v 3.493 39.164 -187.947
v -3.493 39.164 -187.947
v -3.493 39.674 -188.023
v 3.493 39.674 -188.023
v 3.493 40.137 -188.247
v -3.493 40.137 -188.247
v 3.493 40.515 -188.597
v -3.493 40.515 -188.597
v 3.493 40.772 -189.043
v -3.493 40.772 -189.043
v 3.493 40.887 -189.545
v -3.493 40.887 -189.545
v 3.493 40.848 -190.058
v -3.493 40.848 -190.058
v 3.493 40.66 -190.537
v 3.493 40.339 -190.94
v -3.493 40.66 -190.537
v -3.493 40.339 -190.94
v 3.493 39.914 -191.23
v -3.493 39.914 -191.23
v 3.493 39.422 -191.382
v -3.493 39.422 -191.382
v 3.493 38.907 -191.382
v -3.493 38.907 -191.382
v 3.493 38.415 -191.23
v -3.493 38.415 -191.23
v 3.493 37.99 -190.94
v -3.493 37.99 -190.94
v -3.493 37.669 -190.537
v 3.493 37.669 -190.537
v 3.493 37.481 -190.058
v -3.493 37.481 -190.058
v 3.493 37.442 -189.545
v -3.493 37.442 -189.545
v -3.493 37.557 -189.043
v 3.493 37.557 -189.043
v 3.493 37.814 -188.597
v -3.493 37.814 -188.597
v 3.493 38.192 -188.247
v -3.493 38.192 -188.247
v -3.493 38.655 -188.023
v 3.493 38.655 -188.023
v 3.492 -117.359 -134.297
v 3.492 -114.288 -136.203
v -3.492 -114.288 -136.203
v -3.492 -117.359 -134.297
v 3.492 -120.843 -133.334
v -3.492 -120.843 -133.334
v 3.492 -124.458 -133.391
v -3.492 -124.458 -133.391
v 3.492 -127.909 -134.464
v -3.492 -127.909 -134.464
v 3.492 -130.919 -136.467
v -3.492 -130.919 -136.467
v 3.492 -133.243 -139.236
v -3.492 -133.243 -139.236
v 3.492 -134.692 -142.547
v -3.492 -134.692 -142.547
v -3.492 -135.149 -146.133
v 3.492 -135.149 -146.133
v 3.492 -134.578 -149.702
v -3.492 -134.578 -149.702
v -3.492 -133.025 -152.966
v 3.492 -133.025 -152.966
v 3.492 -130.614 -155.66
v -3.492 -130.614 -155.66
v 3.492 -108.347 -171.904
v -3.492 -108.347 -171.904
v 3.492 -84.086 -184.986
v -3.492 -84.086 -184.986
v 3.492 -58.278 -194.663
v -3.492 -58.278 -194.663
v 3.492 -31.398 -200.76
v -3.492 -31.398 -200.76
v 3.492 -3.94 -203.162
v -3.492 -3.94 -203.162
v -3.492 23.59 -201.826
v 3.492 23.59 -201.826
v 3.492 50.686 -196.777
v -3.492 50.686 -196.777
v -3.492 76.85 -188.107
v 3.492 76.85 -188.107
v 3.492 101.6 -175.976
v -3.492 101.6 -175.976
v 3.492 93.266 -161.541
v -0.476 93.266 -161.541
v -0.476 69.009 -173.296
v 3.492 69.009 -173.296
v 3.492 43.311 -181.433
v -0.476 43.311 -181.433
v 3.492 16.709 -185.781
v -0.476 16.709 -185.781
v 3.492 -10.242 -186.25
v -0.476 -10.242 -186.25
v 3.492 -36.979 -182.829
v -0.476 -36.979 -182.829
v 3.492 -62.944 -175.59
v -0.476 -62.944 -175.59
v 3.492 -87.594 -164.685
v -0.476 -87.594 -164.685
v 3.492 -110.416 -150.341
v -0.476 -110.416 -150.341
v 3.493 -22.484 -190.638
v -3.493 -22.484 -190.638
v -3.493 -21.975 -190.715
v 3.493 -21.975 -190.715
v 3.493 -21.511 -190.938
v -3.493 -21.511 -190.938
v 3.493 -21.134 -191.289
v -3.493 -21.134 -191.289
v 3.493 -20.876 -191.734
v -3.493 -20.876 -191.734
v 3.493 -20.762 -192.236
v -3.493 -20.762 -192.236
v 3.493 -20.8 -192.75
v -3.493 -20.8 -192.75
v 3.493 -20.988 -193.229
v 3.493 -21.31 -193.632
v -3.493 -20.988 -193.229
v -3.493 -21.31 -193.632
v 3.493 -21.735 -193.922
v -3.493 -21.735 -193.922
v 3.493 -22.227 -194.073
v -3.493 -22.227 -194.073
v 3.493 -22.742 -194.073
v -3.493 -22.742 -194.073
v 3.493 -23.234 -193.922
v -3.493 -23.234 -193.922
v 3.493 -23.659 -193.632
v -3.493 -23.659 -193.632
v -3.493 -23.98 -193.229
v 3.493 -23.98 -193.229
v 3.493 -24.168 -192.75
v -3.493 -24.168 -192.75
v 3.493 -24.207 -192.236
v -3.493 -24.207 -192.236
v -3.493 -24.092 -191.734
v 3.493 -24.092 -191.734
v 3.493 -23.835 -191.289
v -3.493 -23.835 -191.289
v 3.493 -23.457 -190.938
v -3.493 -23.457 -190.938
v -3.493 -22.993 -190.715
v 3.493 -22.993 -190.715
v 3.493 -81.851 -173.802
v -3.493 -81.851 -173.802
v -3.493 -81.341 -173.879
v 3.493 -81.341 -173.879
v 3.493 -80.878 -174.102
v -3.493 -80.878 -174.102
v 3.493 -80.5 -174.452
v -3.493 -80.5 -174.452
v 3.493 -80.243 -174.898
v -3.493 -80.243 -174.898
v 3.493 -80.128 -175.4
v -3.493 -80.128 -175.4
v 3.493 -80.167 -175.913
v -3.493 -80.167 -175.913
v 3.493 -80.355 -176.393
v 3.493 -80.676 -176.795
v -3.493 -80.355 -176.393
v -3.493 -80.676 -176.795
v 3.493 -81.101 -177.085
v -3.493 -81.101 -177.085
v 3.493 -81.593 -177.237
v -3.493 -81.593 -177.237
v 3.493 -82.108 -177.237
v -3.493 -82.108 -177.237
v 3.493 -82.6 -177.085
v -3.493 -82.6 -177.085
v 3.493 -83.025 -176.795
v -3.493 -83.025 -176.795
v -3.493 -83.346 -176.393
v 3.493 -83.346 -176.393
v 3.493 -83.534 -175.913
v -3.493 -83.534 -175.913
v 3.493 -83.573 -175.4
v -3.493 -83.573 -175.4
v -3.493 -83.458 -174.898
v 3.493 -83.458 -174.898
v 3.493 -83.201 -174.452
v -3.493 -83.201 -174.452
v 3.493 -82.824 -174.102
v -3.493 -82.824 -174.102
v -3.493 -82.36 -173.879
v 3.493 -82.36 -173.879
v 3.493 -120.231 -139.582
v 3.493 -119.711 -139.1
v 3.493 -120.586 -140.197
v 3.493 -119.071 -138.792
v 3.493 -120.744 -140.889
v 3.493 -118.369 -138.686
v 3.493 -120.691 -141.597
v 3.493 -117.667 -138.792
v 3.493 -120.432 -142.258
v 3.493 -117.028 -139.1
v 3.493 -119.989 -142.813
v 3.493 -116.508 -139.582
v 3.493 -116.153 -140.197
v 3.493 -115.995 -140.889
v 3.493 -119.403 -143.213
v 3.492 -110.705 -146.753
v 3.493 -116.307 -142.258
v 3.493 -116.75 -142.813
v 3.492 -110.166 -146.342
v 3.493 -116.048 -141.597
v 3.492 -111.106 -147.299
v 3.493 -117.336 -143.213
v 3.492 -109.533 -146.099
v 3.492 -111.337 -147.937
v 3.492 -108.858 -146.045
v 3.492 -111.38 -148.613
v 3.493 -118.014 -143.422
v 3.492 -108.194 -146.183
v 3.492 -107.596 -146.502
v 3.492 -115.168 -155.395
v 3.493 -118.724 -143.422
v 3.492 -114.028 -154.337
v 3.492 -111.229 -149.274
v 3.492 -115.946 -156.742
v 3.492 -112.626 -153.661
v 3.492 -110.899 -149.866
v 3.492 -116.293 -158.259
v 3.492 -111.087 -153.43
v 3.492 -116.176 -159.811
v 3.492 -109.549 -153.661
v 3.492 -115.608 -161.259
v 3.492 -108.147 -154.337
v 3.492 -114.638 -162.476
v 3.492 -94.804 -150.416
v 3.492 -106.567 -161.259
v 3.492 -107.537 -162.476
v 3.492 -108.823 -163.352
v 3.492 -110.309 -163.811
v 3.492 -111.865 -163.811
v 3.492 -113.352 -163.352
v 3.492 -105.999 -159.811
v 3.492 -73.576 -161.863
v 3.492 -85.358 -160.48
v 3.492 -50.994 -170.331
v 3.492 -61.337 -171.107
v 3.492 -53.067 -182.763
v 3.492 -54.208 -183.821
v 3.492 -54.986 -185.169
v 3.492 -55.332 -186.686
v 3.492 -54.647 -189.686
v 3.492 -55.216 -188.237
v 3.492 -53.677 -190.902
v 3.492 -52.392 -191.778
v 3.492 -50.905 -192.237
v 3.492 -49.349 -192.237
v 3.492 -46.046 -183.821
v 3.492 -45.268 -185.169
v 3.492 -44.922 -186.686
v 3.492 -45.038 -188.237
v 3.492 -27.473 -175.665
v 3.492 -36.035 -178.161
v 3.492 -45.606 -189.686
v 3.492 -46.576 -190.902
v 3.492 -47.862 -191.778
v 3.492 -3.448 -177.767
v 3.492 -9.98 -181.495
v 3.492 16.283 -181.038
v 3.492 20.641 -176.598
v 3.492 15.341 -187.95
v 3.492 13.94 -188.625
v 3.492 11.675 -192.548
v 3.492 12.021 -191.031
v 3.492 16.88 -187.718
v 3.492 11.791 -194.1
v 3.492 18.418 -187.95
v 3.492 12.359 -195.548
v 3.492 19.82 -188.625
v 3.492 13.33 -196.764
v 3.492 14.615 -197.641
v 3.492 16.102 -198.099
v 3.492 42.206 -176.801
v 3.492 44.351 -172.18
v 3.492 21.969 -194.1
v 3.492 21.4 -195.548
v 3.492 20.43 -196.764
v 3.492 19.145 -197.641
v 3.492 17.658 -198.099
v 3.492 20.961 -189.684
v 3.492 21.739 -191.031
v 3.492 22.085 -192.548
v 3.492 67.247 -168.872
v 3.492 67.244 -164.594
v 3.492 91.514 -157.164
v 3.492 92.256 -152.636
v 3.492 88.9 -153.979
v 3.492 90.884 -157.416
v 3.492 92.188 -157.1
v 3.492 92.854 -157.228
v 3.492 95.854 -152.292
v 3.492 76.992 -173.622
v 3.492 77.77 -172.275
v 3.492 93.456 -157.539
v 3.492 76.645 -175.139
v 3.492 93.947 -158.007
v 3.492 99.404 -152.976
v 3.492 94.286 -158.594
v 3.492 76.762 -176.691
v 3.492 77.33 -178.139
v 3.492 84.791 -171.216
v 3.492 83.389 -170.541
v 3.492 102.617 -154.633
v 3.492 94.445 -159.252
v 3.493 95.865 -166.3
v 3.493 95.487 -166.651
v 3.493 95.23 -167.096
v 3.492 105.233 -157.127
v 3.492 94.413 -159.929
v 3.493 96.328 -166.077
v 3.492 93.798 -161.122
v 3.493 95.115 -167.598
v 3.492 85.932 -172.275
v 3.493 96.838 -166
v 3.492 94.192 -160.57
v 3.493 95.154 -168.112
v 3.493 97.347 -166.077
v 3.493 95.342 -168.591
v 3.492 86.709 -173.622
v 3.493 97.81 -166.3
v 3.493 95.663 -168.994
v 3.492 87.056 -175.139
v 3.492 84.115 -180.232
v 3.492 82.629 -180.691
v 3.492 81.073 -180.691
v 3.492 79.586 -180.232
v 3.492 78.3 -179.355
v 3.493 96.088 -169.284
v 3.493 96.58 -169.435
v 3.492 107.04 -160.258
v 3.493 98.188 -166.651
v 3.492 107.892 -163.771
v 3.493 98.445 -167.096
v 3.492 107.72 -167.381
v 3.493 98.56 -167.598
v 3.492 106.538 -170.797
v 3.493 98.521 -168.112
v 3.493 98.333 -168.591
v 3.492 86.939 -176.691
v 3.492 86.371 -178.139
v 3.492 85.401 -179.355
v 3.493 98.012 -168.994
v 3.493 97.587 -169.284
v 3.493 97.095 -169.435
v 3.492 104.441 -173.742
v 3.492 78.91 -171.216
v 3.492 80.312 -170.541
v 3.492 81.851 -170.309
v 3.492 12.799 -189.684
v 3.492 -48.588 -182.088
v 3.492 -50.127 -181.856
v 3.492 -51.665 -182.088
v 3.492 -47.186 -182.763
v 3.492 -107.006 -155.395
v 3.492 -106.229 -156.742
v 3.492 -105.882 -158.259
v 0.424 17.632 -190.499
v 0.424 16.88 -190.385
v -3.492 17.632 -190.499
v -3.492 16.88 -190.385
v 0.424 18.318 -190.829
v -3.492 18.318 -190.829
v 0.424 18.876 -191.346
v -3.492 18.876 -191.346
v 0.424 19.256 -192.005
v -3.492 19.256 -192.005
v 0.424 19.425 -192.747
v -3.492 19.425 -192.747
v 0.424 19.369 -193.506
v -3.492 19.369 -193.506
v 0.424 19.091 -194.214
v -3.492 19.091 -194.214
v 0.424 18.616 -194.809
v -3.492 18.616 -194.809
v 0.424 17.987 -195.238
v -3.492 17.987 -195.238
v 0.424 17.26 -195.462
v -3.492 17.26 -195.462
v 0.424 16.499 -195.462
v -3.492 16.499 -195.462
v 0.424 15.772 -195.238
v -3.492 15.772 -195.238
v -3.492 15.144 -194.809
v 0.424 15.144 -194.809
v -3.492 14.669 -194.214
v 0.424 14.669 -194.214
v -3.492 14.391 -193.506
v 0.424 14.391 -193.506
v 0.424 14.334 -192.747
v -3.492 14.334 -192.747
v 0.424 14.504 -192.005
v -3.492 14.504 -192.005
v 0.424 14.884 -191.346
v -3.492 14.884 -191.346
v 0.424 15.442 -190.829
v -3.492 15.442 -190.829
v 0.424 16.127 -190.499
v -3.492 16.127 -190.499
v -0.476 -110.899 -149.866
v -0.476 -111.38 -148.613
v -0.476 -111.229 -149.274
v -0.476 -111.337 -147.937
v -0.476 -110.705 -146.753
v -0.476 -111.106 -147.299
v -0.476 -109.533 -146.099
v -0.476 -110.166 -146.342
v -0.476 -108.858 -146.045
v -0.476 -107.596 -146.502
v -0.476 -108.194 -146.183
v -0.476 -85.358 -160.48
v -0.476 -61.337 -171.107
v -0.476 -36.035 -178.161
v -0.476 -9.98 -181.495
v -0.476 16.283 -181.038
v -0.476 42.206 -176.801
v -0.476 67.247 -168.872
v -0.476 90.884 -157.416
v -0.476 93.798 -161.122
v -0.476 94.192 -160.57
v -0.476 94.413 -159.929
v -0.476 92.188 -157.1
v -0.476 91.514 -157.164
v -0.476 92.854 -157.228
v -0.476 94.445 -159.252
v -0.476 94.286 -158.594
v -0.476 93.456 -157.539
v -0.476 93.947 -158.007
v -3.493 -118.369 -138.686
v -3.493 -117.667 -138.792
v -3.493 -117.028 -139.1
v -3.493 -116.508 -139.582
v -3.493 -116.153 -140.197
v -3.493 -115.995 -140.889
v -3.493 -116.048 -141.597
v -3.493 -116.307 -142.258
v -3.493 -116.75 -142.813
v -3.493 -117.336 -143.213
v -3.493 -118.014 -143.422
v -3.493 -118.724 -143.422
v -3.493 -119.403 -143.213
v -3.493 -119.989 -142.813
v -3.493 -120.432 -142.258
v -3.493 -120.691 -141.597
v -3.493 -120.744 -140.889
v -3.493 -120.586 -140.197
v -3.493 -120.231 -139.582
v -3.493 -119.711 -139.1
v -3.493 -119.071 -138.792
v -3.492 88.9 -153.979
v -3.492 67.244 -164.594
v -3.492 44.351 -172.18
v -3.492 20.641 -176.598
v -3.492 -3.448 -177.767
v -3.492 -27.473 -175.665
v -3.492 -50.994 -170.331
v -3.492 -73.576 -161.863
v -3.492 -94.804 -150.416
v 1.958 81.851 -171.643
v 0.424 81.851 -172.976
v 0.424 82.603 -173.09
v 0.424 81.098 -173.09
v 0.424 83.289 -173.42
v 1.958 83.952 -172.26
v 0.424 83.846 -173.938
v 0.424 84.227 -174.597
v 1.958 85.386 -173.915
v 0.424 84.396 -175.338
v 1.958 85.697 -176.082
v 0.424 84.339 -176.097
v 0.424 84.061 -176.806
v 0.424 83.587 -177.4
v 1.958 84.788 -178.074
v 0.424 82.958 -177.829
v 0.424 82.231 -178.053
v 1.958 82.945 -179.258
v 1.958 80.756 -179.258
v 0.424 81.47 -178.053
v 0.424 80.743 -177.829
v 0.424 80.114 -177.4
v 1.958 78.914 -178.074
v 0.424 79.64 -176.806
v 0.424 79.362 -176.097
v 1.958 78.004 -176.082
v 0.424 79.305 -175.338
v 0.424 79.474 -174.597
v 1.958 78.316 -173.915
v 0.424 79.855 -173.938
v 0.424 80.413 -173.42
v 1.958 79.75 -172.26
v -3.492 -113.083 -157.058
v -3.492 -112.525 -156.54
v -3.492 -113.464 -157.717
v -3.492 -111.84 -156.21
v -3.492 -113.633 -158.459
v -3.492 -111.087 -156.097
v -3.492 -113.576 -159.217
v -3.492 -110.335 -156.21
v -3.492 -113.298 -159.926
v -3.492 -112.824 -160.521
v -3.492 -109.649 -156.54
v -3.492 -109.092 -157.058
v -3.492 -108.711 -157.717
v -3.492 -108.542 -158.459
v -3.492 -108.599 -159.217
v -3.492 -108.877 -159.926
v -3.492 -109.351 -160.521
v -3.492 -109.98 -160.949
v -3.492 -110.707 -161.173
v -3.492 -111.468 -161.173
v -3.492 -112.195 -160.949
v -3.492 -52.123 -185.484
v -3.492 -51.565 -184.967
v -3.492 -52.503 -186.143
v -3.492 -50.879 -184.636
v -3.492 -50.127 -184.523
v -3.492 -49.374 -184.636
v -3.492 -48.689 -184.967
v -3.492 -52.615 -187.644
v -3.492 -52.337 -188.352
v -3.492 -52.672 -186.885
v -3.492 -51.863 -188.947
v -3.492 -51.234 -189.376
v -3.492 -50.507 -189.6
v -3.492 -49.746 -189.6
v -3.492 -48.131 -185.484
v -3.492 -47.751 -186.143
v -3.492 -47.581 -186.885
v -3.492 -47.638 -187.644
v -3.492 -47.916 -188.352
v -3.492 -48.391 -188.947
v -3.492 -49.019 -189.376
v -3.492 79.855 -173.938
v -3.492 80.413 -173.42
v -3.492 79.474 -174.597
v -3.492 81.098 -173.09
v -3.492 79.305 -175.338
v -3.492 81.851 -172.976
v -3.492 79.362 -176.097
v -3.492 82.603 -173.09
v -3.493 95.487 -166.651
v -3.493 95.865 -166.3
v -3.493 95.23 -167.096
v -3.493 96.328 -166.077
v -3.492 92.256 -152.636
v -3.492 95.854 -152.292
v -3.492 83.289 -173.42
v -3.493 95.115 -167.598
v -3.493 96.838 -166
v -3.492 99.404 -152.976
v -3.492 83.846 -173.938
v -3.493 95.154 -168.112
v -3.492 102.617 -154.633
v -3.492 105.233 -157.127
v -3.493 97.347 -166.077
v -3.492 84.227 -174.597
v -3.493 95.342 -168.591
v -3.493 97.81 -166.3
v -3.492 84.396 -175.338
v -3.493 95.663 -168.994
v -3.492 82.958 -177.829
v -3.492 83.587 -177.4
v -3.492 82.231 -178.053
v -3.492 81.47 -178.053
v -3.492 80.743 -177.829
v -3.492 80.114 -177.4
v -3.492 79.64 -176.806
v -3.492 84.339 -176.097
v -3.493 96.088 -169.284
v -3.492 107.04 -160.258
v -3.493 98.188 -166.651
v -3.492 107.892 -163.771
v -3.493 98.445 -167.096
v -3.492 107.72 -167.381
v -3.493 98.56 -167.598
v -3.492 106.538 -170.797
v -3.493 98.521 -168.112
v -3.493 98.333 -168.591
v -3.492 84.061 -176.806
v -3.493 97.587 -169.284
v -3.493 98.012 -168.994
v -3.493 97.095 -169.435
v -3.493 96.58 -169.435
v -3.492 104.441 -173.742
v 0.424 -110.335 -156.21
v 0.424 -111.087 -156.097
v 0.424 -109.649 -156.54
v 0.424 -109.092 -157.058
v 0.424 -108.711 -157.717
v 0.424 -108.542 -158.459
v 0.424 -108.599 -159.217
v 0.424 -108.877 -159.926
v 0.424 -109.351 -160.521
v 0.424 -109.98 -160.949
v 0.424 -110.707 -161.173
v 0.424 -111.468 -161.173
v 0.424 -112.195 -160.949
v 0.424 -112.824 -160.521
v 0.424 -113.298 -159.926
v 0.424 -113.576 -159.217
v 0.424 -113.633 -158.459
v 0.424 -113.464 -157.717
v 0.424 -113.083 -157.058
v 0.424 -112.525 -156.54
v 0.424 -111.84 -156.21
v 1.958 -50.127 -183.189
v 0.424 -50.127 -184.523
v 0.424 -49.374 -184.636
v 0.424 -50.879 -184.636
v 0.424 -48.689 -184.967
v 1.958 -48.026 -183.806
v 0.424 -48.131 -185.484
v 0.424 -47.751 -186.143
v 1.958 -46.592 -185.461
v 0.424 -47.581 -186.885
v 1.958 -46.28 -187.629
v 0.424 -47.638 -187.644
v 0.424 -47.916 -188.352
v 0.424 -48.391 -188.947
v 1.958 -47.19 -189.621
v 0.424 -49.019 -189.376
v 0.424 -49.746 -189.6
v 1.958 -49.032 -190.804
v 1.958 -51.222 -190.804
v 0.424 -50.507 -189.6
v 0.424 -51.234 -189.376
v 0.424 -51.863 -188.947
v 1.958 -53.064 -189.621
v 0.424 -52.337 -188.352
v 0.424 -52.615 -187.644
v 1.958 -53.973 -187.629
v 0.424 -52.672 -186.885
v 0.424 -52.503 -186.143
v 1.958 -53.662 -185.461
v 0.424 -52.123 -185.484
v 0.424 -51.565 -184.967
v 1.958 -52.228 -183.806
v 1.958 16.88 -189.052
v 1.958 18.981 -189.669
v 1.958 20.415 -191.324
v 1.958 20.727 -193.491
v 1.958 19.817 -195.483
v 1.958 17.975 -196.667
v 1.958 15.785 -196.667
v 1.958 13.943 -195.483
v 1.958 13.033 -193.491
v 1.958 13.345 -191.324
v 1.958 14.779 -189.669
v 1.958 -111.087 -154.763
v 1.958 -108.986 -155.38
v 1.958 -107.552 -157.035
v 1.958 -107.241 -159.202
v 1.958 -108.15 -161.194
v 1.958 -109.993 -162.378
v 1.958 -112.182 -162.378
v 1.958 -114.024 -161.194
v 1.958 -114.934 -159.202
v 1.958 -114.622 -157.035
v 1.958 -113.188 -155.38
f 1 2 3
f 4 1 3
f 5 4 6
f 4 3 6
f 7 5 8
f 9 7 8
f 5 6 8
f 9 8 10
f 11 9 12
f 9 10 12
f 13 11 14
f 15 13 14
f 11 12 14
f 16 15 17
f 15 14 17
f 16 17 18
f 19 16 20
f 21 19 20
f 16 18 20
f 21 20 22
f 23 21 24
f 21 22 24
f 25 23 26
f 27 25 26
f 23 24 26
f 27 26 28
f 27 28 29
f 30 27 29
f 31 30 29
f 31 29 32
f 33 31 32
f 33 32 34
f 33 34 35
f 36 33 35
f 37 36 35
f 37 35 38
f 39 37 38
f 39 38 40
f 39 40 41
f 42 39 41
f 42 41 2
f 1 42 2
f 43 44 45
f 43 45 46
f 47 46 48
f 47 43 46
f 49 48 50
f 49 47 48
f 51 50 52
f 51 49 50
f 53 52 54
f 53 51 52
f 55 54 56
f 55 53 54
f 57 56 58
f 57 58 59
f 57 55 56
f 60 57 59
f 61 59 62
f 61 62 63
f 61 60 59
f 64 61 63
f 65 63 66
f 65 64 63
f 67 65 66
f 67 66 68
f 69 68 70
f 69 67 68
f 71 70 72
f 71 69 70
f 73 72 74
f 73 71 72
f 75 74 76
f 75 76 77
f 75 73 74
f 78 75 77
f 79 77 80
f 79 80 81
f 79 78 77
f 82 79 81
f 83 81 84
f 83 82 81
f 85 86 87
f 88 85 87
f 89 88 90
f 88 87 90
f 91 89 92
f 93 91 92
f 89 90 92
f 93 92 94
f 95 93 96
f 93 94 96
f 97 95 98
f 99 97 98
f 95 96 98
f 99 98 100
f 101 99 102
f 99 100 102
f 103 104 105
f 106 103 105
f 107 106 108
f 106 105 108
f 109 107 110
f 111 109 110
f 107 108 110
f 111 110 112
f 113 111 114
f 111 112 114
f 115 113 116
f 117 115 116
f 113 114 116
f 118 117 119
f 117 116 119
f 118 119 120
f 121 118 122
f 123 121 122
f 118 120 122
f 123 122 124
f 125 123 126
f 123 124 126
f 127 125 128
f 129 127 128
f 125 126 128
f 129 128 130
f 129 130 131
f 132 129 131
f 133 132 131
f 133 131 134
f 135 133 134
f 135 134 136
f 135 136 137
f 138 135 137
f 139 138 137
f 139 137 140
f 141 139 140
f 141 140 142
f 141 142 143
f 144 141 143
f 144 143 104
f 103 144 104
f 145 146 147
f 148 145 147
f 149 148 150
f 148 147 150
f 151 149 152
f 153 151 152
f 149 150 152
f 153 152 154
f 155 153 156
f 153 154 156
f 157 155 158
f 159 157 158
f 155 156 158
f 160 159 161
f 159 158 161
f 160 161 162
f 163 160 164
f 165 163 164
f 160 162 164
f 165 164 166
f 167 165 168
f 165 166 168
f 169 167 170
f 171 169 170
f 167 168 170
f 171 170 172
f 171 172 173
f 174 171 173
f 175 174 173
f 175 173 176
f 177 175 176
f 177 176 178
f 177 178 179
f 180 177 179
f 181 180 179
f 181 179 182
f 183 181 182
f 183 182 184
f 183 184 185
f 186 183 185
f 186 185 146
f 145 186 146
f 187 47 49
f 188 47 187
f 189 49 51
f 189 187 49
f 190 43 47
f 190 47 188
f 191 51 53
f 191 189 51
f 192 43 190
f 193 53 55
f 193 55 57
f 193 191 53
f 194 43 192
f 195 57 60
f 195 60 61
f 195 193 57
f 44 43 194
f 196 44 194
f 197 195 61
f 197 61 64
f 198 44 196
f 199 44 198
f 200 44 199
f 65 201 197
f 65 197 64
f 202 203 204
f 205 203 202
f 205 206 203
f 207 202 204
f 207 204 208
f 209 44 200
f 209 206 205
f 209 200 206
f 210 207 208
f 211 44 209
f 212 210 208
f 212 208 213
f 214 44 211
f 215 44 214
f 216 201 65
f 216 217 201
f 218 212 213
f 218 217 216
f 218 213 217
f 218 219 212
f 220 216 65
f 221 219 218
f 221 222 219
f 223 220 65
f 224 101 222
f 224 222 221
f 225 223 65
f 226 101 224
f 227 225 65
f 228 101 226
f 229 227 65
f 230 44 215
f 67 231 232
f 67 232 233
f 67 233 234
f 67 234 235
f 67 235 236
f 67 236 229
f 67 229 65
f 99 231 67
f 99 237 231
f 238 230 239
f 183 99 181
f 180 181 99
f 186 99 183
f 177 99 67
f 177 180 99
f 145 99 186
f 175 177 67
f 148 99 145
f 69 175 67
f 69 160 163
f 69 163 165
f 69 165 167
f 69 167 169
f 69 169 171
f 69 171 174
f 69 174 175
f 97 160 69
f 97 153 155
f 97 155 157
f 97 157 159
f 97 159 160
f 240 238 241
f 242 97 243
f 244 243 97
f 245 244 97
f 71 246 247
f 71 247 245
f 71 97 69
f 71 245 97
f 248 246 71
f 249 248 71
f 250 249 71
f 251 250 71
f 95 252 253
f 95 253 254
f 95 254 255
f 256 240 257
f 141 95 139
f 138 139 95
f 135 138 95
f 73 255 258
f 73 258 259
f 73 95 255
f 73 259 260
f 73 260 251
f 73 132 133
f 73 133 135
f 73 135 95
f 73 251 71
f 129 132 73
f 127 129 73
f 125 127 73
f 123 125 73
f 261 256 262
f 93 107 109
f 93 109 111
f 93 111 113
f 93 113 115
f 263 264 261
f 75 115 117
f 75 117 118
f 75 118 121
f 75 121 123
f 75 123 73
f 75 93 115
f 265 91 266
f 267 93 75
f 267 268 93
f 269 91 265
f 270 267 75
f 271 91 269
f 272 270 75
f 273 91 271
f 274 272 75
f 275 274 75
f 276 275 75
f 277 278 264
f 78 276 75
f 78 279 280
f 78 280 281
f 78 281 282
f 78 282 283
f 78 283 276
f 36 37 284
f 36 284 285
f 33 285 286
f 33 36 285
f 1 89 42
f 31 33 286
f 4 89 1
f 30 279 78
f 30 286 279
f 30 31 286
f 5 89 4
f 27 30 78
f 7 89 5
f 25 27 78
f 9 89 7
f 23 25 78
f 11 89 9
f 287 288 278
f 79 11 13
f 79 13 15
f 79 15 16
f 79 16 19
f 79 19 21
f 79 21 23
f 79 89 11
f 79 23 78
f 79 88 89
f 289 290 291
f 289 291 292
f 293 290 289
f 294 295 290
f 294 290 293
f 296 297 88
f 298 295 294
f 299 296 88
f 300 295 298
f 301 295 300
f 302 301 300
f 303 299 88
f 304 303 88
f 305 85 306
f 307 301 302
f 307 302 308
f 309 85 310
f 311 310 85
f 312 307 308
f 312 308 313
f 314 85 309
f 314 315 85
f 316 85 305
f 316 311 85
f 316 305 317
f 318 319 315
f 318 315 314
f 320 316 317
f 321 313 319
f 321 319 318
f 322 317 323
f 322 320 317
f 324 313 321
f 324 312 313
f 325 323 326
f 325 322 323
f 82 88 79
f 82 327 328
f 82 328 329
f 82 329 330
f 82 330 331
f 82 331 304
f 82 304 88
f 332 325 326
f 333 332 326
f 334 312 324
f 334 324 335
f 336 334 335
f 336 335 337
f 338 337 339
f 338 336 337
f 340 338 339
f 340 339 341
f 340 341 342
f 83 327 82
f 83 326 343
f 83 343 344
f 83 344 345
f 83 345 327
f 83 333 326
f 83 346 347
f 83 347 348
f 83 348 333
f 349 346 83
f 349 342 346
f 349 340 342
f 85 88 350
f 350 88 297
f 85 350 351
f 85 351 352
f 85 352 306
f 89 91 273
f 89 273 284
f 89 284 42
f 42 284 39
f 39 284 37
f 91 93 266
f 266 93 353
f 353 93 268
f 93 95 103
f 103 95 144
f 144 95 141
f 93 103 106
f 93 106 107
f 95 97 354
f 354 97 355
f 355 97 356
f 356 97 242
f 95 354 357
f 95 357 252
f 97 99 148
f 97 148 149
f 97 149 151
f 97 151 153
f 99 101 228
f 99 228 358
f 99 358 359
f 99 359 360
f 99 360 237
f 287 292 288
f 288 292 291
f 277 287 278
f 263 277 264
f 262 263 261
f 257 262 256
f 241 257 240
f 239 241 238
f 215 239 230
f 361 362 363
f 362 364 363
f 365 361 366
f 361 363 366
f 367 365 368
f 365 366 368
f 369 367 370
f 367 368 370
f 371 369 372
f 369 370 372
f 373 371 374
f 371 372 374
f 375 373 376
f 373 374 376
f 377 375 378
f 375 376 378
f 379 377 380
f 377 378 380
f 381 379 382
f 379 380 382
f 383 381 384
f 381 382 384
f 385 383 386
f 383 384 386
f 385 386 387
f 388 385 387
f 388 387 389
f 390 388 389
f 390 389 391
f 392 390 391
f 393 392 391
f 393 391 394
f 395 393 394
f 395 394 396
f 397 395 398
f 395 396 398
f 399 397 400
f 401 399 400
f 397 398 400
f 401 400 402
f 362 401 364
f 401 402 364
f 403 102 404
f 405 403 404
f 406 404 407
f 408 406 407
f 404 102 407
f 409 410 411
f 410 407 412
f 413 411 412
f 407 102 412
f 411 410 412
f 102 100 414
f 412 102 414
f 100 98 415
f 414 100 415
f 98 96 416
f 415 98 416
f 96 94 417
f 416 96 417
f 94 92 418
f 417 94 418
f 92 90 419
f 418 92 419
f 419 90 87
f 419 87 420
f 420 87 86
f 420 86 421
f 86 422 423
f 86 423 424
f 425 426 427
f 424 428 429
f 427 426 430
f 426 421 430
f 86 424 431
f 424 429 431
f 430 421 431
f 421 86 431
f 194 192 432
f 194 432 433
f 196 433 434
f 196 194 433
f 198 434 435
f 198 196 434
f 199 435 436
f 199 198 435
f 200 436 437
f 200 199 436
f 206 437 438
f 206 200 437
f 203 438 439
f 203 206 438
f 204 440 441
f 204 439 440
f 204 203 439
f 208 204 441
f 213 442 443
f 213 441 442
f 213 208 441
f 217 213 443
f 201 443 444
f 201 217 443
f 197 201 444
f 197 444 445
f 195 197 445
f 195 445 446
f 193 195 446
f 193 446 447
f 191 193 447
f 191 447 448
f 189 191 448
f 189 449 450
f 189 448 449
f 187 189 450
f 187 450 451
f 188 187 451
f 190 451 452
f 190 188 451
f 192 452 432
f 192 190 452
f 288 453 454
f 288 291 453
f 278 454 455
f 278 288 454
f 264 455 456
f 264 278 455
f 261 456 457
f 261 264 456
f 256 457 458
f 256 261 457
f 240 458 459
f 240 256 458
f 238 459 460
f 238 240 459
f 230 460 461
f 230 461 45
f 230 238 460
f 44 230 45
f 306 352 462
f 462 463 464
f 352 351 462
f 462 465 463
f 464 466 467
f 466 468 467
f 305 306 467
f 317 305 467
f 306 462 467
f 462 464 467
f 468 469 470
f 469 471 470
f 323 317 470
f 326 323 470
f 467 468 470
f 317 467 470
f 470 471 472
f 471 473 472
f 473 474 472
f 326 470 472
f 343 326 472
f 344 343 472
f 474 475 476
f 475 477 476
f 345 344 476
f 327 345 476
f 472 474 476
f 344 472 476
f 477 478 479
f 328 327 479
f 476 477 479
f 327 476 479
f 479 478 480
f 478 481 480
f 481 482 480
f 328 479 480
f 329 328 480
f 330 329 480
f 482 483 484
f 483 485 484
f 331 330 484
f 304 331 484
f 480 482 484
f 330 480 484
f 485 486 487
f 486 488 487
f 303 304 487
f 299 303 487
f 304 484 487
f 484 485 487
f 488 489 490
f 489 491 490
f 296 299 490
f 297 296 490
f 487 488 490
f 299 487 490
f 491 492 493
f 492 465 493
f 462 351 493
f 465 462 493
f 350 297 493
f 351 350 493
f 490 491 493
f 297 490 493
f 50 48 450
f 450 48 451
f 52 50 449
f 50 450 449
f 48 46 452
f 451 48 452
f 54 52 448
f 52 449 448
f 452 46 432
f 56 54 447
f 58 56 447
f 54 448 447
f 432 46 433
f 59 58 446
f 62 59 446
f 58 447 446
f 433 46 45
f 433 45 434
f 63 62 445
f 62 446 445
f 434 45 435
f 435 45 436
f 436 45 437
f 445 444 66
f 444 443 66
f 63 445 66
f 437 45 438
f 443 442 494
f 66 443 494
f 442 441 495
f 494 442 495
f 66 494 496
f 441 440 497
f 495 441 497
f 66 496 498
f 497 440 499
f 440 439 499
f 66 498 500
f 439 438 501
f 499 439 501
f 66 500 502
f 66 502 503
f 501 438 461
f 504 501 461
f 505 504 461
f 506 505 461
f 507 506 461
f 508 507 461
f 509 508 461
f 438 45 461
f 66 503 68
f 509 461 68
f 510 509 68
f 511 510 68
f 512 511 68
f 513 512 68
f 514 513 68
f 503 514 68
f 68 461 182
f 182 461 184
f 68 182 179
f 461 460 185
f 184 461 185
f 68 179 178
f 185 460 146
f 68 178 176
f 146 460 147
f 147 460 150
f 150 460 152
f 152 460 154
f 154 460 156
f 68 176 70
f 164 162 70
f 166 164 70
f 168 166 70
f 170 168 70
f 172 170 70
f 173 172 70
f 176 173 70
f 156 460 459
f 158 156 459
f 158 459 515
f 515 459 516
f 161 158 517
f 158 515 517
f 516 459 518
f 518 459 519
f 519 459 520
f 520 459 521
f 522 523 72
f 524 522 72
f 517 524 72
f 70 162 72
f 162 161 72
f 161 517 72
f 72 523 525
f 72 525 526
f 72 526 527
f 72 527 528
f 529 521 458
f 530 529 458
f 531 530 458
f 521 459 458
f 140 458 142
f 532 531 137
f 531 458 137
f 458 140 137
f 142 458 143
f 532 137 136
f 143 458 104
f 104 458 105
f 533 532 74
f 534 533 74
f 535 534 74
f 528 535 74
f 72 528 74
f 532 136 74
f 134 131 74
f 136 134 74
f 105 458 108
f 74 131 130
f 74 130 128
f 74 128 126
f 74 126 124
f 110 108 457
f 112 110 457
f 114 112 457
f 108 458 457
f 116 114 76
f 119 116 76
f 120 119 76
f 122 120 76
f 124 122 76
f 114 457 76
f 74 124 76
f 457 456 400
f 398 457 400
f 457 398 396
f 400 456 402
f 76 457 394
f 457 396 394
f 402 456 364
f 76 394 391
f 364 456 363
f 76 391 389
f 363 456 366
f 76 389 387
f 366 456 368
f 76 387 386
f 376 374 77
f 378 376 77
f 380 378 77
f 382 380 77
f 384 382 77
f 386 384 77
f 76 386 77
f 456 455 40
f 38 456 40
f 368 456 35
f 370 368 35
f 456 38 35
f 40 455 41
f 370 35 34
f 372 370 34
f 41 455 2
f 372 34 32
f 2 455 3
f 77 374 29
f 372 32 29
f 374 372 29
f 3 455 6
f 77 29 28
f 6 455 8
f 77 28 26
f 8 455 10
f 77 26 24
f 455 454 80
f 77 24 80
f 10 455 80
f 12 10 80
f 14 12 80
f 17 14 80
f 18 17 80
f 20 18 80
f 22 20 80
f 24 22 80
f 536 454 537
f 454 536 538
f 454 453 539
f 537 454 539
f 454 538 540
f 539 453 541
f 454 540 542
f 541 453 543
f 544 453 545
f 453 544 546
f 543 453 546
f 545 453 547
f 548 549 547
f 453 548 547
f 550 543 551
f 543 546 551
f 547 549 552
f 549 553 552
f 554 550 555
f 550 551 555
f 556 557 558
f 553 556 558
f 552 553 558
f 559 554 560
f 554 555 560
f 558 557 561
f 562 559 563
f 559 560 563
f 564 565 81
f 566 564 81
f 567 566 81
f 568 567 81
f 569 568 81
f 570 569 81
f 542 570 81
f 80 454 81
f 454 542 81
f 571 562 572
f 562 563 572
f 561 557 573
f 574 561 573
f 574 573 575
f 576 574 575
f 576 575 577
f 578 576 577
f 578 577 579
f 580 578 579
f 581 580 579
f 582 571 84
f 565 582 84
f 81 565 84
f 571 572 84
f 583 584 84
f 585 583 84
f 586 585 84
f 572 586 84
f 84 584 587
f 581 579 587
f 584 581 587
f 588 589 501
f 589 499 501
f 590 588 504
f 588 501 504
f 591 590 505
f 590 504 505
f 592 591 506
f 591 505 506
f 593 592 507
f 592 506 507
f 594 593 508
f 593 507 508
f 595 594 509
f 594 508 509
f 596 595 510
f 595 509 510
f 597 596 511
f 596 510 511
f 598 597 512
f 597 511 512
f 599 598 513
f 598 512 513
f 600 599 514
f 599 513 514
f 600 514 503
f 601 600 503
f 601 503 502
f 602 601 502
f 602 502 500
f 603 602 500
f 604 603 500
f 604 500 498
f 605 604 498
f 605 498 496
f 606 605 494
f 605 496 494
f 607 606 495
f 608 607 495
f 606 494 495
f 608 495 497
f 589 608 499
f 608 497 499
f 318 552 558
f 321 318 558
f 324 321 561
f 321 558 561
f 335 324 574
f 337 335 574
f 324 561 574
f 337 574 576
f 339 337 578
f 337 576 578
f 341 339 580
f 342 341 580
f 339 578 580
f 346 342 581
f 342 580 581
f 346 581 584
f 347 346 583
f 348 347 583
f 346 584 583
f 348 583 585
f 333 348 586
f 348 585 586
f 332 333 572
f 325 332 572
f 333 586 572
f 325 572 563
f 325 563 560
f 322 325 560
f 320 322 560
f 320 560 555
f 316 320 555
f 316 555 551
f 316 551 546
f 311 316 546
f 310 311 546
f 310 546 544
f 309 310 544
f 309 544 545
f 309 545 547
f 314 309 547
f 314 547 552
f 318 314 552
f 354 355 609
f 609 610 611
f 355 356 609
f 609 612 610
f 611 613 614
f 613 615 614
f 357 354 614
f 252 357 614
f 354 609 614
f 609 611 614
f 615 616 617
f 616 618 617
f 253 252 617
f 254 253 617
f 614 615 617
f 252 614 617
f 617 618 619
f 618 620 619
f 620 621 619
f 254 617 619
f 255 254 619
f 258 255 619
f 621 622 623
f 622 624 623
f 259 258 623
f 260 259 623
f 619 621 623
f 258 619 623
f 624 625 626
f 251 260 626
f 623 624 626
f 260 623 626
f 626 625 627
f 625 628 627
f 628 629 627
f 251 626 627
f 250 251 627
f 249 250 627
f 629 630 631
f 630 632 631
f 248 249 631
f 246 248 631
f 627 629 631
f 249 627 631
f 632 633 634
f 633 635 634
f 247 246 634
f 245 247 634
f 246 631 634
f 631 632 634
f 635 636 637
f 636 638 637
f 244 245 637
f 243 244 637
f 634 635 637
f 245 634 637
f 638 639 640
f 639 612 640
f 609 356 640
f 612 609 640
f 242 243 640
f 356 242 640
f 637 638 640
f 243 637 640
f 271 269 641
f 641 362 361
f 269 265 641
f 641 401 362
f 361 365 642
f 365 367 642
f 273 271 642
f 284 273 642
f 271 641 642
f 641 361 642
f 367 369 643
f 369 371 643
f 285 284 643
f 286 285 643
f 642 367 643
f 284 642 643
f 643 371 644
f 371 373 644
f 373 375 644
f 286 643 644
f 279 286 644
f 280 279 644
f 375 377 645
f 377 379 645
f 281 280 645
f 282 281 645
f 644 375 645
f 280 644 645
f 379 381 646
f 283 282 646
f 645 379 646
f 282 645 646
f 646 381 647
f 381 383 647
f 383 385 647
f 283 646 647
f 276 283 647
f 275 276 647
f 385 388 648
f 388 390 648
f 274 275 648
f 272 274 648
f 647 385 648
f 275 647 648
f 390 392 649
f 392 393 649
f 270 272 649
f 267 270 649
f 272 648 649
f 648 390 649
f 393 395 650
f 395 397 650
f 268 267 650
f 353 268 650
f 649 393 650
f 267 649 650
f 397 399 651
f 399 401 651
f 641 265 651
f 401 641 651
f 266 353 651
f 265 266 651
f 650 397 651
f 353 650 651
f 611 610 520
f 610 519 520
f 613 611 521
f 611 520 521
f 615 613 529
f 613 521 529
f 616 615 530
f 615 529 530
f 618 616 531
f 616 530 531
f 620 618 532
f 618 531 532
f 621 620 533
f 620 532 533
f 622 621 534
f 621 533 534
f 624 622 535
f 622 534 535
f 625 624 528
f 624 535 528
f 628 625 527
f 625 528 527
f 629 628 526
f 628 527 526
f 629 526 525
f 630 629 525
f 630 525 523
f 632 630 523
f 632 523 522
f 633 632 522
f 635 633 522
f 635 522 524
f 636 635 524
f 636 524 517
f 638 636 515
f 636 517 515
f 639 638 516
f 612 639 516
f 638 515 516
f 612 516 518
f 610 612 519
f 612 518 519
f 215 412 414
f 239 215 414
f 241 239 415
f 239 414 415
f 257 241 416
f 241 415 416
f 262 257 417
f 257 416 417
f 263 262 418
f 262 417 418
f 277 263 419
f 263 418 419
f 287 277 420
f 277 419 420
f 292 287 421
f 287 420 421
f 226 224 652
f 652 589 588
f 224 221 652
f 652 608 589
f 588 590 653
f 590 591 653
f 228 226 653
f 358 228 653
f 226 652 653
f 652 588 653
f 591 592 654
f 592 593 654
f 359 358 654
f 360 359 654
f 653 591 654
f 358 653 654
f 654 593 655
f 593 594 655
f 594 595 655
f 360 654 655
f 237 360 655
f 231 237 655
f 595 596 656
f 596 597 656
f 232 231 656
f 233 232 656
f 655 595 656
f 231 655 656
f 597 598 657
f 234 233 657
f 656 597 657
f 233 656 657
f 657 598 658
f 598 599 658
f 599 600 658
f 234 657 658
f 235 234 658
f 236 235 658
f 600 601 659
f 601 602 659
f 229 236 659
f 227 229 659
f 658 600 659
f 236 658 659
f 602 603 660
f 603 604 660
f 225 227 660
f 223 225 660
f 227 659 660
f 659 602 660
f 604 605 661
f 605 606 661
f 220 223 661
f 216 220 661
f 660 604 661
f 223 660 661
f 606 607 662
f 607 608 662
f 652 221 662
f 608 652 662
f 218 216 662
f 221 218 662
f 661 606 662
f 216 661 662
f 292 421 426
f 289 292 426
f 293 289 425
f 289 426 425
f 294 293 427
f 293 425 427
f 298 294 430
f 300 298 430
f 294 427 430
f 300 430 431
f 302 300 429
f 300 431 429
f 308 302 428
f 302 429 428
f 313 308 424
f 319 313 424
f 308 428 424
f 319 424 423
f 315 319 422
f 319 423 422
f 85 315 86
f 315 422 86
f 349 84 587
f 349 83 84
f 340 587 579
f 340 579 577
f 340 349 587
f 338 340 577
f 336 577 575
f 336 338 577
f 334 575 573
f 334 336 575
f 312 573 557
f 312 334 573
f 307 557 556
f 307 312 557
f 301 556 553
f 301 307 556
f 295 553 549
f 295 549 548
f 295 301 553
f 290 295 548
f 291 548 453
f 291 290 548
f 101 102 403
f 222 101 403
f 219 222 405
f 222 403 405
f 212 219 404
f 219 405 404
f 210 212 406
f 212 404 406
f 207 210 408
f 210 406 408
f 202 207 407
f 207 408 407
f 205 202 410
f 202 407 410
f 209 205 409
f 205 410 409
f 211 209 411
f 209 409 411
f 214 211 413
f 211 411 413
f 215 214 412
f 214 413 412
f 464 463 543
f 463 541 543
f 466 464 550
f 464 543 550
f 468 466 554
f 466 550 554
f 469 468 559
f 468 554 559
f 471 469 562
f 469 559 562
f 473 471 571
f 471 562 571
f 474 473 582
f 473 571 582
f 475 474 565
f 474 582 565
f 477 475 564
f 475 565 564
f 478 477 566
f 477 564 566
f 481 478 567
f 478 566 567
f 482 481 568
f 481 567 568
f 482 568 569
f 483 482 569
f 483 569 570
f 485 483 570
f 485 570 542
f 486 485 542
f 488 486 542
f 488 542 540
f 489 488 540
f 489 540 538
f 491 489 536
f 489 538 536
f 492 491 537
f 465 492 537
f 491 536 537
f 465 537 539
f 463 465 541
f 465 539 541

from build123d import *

# Parameters (mm, degrees)
BOSS_EXTRUDE1_DEPTH                                = 3.4925
CUT_EXTRUDE1_DEPTH                                 = 3.96875
CSK_FOR_10_FLAT_HEAD_SOCKET_CAP_SCREW1_D           = 5.1054
CSK_FOR_10_FLAT_HEAD_SOCKET_CAP_SCREW1_CSINK_D     = 10.4394
CSK_FOR_10_FLAT_HEAD_SOCKET_CAP_SCREW1_CSINK_ANGLE = 82
CUT_EXTRUDE2_DEPTH                                 = 245.141012004
CUT_EXTRUDE2_DEPTH_BACK                            = 245.141012004
SKETCH3_3_R                                        = 2.38125
F_8_32_TAPPED_HOLE2_D                              = 3.4544


with BuildPart() as part:
    # Sketch2 → Boss-Extrude1 (new, symmetric)
    with BuildSketch(Plane(origin=(0, 0, 0), x_dir=(0, 0, -1), z_dir=(1, 0, 0))):
        with BuildLine():
            ThreePointArc((153.979316793, 88.9), (177.123417321, -15.496291061), (136.202701987, -114.287637002))
            ThreePointArc((136.202701987, -114.287637002), (137.768063771, -132.179804073), (155.660230842, -130.614442288))
            ThreePointArc((155.660230842, -130.614442288), (202.426762652, -17.710046926), (175.976362049, 101.6))
            ThreePointArc((175.976362049, 101.6), (158.627839421, 106.248522628), (153.979316793, 88.9))
        make_face()
    extrude(amount=BOSS_EXTRUDE1_DEPTH, both=True)

    # Sketch3 → Cut-Extrude1 (cut, symmetric)
    with BuildSketch(Plane.ZY.offset(-3.4925)):
        with BuildLine():
            ThreePointArc((-161.5408011, 93.265625), (-186.249876712, -10.241613709), (-150.340665851, -110.415539748))
            ThreePointArc((-150.340665851, -110.415539748), (-147.011863227, -110.925222209), (-146.502180766, -107.596419585))
            ThreePointArc((-146.502180766, -107.596419585), (-181.494560711, -9.980125699), (-157.416355114, 90.884375))
            ThreePointArc((-157.416355114, 90.884375), (-158.287953107, 94.137222993), (-161.5408011, 93.265625))
        make_face()
    extrude(amount=CUT_EXTRUDE1_DEPTH, both=True, mode=Mode.SUBTRACT)

    # CSK for #10 Flat Head Socket Cap Screw1 (through all)
    with Locations(Plane(origin=(3.4925, 0, 0), x_dir=(0, 0, -1), z_dir=(1, 0, 0))):
        with Locations((175.529160654, 81.850591843), (192.938008153, 16.879888477), (187.075684407, -50.12677856), (158.649272178, -111.08741631)):
            CounterSinkHole(CSK_FOR_10_FLAT_HEAD_SOCKET_CAP_SCREW1_D / 2, CSK_FOR_10_FLAT_HEAD_SOCKET_CAP_SCREW1_CSINK_D / 2, counter_sink_angle=CSK_FOR_10_FLAT_HEAD_SOCKET_CAP_SCREW1_CSINK_ANGLE)

    # Sketch3<3> → Cut-Extrude2 (cut, two sides: drawn at the far end of the back side and taken through both)
    with BuildSketch(Plane.ZY.offset(-3.4925).offset(-CUT_EXTRUDE2_DEPTH_BACK)):
        with Locations((-141.0670842, -118.369338324)):
            Circle(SKETCH3_3_R)
    extrude(amount=CUT_EXTRUDE2_DEPTH + CUT_EXTRUDE2_DEPTH_BACK, mode=Mode.SUBTRACT)

    # #8-32 Tapped Hole2 (through all)
    with Locations(Plane(origin=(3.4925, 0, 0), x_dir=(0, 0, -1), z_dir=(1, 0, 0))):
        with Locations((167.727470078, 96.8375), (189.67379492, 39.164488321), (175.529160654, -81.850591843), (192.365438936, -22.484295143)):
            Hole(F_8_32_TAPPED_HOLE2_D / 2)


solid = part.part
